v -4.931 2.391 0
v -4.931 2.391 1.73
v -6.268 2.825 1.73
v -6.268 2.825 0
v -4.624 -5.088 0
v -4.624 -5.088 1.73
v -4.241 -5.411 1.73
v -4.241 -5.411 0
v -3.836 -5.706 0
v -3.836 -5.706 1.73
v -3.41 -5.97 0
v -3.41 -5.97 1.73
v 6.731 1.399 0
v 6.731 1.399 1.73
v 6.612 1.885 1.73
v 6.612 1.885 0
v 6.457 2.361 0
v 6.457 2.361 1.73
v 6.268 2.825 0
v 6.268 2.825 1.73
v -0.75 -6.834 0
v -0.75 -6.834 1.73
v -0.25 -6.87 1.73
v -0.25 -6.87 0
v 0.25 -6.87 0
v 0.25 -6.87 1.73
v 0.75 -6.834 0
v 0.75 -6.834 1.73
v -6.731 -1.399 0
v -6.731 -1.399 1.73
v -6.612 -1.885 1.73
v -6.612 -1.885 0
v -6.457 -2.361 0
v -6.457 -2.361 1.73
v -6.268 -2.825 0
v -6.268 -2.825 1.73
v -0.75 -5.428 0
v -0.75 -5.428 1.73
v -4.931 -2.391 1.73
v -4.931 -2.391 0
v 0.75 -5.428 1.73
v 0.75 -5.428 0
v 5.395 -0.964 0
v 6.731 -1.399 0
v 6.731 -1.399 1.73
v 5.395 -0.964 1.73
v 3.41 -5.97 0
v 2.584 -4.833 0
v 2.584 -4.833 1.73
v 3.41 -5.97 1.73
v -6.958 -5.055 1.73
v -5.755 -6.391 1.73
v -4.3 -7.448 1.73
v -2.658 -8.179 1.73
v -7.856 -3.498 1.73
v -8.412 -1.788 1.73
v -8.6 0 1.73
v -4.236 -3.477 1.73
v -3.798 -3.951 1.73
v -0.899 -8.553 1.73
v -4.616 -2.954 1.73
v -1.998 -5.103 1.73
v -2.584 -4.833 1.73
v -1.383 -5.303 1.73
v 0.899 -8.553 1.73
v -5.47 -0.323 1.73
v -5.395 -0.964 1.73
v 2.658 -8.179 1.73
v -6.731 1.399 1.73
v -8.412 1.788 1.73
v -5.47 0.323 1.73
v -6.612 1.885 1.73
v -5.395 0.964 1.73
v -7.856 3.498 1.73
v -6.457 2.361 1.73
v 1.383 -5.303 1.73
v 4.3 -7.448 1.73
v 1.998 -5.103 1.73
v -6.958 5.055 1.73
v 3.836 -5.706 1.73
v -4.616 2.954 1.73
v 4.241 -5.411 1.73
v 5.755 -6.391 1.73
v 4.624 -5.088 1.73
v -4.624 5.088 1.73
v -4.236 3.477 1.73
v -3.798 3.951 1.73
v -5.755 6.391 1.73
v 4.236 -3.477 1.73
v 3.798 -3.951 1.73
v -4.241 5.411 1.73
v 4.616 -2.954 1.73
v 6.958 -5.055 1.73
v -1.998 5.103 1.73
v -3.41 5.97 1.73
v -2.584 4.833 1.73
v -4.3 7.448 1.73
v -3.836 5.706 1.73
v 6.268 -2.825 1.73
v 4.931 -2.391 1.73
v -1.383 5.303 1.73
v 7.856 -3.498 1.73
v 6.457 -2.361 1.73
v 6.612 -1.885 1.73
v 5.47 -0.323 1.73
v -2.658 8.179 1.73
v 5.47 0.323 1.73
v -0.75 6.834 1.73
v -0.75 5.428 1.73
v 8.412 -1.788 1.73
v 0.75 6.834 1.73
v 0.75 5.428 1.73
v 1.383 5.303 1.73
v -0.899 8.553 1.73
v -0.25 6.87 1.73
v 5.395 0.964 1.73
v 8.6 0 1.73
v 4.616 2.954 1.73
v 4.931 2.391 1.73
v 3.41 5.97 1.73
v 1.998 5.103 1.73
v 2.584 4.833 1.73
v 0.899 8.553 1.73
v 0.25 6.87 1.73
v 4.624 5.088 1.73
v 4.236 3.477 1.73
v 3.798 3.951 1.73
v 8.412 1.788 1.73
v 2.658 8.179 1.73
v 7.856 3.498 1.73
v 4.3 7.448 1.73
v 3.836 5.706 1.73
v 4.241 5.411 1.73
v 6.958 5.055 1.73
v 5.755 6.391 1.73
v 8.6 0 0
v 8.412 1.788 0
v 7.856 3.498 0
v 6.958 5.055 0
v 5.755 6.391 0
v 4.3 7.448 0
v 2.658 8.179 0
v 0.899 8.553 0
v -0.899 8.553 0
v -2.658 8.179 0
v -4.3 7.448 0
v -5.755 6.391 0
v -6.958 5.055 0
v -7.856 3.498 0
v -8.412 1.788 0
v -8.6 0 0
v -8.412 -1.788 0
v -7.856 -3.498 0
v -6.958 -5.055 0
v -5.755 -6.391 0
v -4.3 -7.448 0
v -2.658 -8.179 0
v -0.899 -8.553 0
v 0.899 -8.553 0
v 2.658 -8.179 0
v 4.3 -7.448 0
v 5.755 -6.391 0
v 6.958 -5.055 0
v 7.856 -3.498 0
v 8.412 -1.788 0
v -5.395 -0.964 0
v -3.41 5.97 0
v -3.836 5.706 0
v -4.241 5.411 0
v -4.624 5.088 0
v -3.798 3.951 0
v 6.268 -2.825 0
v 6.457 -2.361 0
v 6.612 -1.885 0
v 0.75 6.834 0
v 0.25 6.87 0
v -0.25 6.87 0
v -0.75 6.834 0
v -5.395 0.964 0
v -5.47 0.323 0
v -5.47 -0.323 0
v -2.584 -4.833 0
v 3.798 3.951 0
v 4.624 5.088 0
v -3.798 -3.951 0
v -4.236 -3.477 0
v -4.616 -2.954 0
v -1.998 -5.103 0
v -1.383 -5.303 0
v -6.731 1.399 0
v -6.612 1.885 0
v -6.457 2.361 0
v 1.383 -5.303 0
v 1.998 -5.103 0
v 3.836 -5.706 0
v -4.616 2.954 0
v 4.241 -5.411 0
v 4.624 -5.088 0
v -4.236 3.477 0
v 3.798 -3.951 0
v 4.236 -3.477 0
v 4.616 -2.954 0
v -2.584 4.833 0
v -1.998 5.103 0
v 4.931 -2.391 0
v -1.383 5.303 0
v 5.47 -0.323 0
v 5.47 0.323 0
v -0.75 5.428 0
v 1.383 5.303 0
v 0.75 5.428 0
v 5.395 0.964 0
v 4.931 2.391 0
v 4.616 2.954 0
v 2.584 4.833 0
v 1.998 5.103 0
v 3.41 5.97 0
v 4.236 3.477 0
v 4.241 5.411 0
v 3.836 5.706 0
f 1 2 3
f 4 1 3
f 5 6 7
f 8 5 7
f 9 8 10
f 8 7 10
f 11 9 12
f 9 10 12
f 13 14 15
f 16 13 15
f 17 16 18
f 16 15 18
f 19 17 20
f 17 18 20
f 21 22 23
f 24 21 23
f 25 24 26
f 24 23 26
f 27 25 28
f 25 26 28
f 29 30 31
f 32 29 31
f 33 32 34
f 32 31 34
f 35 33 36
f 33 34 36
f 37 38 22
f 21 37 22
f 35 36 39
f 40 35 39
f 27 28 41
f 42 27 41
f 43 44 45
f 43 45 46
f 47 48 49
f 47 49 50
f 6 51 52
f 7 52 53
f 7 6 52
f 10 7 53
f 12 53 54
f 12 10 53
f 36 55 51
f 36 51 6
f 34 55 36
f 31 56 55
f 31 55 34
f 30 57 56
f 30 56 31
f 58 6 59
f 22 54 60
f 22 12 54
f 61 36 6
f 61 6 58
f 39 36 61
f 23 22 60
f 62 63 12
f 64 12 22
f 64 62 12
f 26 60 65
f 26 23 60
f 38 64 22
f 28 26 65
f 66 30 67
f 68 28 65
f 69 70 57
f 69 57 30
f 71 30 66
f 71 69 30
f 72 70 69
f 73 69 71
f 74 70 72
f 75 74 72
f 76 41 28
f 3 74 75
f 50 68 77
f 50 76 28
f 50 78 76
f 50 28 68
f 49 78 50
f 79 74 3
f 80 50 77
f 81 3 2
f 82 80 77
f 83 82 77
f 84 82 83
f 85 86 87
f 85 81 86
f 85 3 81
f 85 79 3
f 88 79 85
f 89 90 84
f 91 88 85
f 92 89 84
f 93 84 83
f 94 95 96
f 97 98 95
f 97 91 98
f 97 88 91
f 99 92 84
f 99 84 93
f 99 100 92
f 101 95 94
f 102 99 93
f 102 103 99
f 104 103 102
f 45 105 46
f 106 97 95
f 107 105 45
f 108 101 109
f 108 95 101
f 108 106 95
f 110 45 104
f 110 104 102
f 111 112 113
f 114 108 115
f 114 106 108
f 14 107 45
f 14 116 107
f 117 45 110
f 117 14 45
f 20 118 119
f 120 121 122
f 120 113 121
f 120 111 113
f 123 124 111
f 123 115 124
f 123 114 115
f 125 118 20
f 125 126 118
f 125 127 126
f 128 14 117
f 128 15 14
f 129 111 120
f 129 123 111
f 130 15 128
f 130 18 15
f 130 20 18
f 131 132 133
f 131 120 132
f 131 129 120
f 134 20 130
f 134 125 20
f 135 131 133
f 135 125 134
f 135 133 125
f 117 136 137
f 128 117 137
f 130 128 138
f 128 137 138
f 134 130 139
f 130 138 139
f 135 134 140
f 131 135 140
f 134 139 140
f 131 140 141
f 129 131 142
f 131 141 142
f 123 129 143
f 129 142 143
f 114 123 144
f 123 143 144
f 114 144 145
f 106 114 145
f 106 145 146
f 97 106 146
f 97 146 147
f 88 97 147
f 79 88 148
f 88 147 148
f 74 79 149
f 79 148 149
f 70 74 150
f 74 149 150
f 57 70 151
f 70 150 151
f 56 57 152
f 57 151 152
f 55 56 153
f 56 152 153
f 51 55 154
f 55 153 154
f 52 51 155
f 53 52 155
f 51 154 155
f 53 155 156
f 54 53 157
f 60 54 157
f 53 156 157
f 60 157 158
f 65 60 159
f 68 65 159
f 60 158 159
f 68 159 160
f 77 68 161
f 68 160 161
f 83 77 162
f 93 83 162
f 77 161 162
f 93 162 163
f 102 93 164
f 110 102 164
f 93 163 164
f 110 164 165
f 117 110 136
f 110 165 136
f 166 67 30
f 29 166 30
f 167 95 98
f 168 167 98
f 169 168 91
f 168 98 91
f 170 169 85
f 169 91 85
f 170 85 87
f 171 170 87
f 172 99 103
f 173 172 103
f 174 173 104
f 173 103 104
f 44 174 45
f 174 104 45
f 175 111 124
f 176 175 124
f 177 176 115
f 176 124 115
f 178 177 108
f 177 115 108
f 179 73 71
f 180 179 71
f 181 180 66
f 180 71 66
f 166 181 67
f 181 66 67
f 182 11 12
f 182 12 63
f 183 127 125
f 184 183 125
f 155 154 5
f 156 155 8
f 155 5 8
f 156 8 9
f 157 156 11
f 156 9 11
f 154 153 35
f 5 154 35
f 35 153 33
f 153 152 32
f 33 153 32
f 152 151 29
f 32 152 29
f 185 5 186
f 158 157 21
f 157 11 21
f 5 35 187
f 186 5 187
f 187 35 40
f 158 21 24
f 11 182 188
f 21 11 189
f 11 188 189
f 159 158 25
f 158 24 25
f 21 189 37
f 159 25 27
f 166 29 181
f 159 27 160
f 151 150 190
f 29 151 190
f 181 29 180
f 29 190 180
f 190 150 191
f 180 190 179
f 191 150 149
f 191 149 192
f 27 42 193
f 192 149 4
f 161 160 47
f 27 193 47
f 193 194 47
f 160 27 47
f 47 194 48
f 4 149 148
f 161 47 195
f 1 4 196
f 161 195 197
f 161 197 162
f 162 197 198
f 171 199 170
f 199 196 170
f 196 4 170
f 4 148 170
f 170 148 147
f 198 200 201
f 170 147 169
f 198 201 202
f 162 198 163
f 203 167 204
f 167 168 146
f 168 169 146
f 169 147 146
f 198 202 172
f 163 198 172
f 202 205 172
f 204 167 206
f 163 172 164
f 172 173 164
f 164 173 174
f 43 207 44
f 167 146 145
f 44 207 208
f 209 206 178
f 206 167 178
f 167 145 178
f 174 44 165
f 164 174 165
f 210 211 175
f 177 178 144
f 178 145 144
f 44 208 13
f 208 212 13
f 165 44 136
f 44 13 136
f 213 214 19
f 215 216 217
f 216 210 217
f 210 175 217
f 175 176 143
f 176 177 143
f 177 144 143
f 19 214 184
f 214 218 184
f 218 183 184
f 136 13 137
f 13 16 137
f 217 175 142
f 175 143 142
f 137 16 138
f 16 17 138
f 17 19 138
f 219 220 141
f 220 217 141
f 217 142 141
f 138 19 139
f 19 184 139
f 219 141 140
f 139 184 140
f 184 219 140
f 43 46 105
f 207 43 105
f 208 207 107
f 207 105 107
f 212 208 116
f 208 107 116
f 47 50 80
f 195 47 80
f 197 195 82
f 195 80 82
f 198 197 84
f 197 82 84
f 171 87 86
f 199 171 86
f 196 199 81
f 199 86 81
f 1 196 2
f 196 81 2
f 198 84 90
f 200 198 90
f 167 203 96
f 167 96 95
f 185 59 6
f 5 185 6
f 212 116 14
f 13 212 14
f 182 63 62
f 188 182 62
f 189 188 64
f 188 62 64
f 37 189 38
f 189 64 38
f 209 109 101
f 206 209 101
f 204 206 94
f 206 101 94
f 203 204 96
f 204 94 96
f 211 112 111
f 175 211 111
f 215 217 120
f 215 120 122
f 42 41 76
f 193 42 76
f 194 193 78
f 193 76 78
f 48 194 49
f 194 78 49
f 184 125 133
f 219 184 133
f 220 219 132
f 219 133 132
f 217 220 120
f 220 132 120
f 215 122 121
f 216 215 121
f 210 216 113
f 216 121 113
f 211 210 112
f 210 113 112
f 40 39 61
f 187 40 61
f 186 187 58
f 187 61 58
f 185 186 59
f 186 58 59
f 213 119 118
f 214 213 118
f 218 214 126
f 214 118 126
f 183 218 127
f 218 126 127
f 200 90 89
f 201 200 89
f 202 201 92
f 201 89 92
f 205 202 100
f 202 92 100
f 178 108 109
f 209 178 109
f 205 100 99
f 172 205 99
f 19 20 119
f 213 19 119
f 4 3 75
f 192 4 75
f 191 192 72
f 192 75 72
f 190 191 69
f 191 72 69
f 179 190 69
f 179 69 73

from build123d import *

# Parameters (mm, degrees)
SZKIC1_R                    = 8.6
DODANIE_WYCI_GNI_CIE1_DEPTH = 1.73
WYTNIJ_WYCI_GNI_CIE1_DEPTH  = 1.73


with BuildPart() as part:
    # Szkic1 → Dodanie-wyciągnięcie1 (new body)
    with BuildSketch(Plane.XY):
        Circle(SZKIC1_R)
    extrude(amount=DODANIE_WYCI_GNI_CIE1_DEPTH)

    # Szkic2 → Wytnij-wyciągnięcie1 (cut)
    with BuildSketch(Plane.XY.offset(1.73)):
        with BuildLine():
            Line((-2.583990936, 4.832534619), (-3.410143133, 5.969635568))
            ThreePointArc((-3.410143133, 5.969635568), (-4.04102361, 5.561991836), (-4.623668625, 5.087957689))
            Line((-4.623668625, 5.087957689), (-3.797516427, 3.950856741))
            ThreePointArc((-3.797516427, 3.950856741), (-4.433413129, 3.221063183), (-4.930985161, 2.390770869))
            Line((-4.930985161, 2.390770869), (-6.267727496, 2.825104782))
            ThreePointArc((-6.267727496, 2.825104782), (-6.53851355, 2.124491836), (-6.731252988, 1.398520008))
            Line((-6.731252988, 1.398520008), (-5.394510652, 0.964186094))
            ThreePointArc((-5.394510652, 0.964186094), (-5.48, 0), (-5.394510652, -0.964186094))
            Line((-5.394510652, -0.964186094), (-6.731252988, -1.398520008))
            ThreePointArc((-6.731252988, -1.398520008), (-6.53851355, -2.124491836), (-6.267727496, -2.825104782))
            Line((-6.267727496, -2.825104782), (-4.930985161, -2.390770869))
            ThreePointArc((-4.930985161, -2.390770869), (-4.433413129, -3.221063183), (-3.797516427, -3.950856741))
            Line((-3.797516427, -3.950856741), (-4.623668625, -5.087957689))
            ThreePointArc((-4.623668625, -5.087957689), (-4.04102361, -5.561991836), (-3.410143133, -5.969635568))
            Line((-3.410143133, -5.969635568), (-2.583990936, -4.832534619))
            ThreePointArc((-2.583990936, -4.832534619), (-1.693413129, -5.211789709), (-0.75, -5.428434397))
            Line((-0.75, -5.428434397), (-0.75, -6.833968466))
            ThreePointArc((-0.75, -6.833968466), (0, -6.875), (0.75, -6.833968466))
            Line((0.75, -6.833968466), (0.75, -5.428434397))
            ThreePointArc((0.75, -5.428434397), (1.693413129, -5.211789709), (2.583990936, -4.832534619))
            Line((2.583990936, -4.832534619), (3.410143133, -5.969635568))
            ThreePointArc((3.410143133, -5.969635568), (4.04102361, -5.561991836), (4.623668625, -5.087957689))
            Line((4.623668625, -5.087957689), (3.797516427, -3.950856741))
            ThreePointArc((3.797516427, -3.950856741), (4.433413129, -3.221063183), (4.930985161, -2.390770869))
            Line((4.930985161, -2.390770869), (6.267727496, -2.825104782))
            ThreePointArc((6.267727496, -2.825104782), (6.53851355, -2.124491836), (6.731252988, -1.398520008))
            Line((6.731252988, -1.398520008), (5.394510652, -0.964186094))
            ThreePointArc((5.394510652, -0.964186094), (5.48, 0), (5.394510652, 0.964186094))
            Line((5.394510652, 0.964186094), (6.731252988, 1.398520008))
            ThreePointArc((6.731252988, 1.398520008), (6.53851355, 2.124491836), (6.267727496, 2.825104782))
            Line((6.267727496, 2.825104782), (4.930985161, 2.390770869))
            ThreePointArc((4.930985161, 2.390770869), (4.433413129, 3.221063183), (3.797516427, 3.950856741))
            Line((3.797516427, 3.950856741), (4.623668625, 5.087957689))
            ThreePointArc((4.623668625, 5.087957689), (4.04102361, 5.561991836), (3.410143133, 5.969635568))
            Line((3.410143133, 5.969635568), (2.583990936, 4.832534619))
            ThreePointArc((2.583990936, 4.832534619), (1.693413129, 5.211789709), (0.75, 5.428434397))
            Line((0.75, 5.428434397), (0.75, 6.833968466))
            ThreePointArc((0.75, 6.833968466), (0, 6.875), (-0.75, 6.833968466))
            Line((-0.75, 6.833968466), (-0.75, 5.428434397))
            ThreePointArc((-0.75, 5.428434397), (-1.693413129, 5.211789709), (-2.583990936, 4.832534619))
        make_face()
    extrude(amount=-WYTNIJ_WYCI_GNI_CIE1_DEPTH, mode=Mode.SUBTRACT)


solid = part.part
